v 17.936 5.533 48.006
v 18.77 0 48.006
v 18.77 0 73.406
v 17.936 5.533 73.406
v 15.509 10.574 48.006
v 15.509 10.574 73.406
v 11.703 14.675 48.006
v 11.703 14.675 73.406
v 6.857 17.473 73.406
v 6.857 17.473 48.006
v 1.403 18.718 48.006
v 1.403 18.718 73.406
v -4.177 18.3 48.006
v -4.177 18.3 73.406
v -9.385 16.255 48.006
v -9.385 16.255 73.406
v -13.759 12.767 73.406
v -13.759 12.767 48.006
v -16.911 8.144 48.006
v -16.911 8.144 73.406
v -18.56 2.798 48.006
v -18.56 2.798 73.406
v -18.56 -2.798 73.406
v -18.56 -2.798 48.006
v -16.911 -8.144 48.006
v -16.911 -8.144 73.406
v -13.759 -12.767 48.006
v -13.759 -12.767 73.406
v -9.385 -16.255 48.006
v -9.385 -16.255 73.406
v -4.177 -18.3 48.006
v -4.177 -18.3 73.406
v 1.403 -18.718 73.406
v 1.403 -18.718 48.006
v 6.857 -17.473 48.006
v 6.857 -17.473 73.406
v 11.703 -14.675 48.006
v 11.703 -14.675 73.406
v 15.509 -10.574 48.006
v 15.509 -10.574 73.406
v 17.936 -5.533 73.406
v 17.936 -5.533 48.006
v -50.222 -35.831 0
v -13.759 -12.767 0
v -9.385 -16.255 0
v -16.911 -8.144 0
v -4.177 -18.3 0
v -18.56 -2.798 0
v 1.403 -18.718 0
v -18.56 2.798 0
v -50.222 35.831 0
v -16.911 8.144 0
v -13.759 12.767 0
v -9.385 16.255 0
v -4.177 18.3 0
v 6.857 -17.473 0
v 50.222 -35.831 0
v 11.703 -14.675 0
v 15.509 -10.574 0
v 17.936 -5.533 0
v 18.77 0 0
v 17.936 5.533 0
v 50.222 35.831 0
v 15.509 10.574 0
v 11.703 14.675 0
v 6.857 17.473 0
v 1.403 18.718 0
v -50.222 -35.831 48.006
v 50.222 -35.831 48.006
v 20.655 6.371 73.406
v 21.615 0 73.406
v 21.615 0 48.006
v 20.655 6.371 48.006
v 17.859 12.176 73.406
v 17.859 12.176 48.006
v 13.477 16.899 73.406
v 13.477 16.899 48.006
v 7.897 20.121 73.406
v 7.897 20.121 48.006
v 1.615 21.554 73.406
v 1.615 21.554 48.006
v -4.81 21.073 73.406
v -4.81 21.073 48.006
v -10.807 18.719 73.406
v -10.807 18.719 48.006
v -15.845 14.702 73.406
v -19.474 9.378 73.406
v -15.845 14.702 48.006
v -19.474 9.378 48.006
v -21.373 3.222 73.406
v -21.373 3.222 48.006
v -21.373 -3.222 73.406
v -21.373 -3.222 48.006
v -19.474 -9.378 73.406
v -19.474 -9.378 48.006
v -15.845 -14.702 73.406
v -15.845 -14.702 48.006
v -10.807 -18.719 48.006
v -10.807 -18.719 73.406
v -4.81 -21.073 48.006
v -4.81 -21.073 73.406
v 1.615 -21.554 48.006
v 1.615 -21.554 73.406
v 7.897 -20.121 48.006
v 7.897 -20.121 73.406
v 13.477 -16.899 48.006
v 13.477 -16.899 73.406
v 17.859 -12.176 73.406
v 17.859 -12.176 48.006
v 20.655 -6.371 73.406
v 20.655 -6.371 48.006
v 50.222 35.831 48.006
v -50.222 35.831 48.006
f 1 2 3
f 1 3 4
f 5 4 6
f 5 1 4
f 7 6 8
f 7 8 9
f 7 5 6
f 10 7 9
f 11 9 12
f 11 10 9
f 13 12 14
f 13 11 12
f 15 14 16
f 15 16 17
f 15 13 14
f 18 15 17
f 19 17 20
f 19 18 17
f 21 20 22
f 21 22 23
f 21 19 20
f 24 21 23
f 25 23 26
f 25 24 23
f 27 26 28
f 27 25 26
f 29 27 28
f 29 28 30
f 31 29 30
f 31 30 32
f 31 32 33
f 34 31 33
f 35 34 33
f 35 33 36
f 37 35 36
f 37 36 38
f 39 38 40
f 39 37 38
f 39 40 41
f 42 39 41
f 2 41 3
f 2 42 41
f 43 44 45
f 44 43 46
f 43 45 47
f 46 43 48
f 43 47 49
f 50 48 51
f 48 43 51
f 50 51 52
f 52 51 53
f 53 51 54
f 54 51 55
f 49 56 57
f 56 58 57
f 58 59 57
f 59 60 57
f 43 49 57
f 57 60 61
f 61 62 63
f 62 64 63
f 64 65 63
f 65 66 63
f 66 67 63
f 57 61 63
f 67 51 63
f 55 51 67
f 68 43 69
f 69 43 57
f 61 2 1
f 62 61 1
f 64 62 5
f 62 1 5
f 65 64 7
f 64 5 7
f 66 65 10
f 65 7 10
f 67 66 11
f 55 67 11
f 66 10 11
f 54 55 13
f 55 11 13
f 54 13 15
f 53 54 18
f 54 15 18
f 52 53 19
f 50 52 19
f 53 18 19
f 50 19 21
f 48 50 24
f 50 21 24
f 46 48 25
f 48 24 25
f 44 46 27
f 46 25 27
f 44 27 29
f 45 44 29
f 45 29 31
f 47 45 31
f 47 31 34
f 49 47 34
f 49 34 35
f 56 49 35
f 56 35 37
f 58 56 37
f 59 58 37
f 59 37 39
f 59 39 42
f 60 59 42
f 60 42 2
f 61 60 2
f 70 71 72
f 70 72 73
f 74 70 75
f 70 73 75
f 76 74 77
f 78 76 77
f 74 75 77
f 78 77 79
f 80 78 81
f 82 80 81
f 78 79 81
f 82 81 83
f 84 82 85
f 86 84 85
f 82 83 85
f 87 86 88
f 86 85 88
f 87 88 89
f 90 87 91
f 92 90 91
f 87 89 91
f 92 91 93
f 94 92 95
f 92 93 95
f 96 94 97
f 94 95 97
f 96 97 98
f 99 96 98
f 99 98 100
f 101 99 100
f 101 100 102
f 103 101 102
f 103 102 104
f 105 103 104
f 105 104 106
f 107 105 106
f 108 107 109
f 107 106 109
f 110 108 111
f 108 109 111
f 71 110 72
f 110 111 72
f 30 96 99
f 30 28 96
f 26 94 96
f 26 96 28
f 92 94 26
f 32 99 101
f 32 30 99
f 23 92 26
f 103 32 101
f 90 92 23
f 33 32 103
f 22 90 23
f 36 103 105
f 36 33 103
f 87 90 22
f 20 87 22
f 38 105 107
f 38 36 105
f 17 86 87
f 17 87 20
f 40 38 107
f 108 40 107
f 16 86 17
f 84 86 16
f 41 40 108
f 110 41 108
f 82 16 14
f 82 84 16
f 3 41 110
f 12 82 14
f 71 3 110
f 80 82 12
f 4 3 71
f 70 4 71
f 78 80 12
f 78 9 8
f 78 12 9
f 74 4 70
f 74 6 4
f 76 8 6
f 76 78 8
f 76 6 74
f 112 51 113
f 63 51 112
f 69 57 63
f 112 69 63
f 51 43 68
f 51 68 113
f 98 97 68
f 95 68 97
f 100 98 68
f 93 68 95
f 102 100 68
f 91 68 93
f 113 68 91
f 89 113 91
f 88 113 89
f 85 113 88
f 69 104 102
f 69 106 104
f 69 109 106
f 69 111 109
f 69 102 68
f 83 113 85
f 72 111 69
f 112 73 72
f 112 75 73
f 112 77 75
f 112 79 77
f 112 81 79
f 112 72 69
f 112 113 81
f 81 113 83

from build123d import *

# Parameters (mm, degrees)
F0_W      = 100.443094
F0_H      = 71.661144
F1_DEPTH  = 48.006
F2_R      = 21.614907
F2_R_2    = 18.770119
F3_DEPTH  = 25.4
F3_FACE_R = 18.770119
F4_DEPTH  = 86.36


with BuildPart() as f1:
    # F0 (on Top) → F1 (new body)
    with BuildSketch(Plane.XY):
        Rectangle(F0_W, F0_H)
    extrude(amount=F1_DEPTH)

    # F2 (on face) → F3 (join)
    with BuildSketch(Plane.XY.offset(48.006)):
        Circle(F2_R)
        Circle(F2_R_2, mode=Mode.SUBTRACT)
    extrude(amount=F3_DEPTH)

    # F3_face (on face) → F4 (cut)
    with BuildSketch(Plane.XY.offset(48.006)):
        Circle(F3_FACE_R)
    extrude(amount=-F4_DEPTH, mode=Mode.SUBTRACT)


solid = f1.part
